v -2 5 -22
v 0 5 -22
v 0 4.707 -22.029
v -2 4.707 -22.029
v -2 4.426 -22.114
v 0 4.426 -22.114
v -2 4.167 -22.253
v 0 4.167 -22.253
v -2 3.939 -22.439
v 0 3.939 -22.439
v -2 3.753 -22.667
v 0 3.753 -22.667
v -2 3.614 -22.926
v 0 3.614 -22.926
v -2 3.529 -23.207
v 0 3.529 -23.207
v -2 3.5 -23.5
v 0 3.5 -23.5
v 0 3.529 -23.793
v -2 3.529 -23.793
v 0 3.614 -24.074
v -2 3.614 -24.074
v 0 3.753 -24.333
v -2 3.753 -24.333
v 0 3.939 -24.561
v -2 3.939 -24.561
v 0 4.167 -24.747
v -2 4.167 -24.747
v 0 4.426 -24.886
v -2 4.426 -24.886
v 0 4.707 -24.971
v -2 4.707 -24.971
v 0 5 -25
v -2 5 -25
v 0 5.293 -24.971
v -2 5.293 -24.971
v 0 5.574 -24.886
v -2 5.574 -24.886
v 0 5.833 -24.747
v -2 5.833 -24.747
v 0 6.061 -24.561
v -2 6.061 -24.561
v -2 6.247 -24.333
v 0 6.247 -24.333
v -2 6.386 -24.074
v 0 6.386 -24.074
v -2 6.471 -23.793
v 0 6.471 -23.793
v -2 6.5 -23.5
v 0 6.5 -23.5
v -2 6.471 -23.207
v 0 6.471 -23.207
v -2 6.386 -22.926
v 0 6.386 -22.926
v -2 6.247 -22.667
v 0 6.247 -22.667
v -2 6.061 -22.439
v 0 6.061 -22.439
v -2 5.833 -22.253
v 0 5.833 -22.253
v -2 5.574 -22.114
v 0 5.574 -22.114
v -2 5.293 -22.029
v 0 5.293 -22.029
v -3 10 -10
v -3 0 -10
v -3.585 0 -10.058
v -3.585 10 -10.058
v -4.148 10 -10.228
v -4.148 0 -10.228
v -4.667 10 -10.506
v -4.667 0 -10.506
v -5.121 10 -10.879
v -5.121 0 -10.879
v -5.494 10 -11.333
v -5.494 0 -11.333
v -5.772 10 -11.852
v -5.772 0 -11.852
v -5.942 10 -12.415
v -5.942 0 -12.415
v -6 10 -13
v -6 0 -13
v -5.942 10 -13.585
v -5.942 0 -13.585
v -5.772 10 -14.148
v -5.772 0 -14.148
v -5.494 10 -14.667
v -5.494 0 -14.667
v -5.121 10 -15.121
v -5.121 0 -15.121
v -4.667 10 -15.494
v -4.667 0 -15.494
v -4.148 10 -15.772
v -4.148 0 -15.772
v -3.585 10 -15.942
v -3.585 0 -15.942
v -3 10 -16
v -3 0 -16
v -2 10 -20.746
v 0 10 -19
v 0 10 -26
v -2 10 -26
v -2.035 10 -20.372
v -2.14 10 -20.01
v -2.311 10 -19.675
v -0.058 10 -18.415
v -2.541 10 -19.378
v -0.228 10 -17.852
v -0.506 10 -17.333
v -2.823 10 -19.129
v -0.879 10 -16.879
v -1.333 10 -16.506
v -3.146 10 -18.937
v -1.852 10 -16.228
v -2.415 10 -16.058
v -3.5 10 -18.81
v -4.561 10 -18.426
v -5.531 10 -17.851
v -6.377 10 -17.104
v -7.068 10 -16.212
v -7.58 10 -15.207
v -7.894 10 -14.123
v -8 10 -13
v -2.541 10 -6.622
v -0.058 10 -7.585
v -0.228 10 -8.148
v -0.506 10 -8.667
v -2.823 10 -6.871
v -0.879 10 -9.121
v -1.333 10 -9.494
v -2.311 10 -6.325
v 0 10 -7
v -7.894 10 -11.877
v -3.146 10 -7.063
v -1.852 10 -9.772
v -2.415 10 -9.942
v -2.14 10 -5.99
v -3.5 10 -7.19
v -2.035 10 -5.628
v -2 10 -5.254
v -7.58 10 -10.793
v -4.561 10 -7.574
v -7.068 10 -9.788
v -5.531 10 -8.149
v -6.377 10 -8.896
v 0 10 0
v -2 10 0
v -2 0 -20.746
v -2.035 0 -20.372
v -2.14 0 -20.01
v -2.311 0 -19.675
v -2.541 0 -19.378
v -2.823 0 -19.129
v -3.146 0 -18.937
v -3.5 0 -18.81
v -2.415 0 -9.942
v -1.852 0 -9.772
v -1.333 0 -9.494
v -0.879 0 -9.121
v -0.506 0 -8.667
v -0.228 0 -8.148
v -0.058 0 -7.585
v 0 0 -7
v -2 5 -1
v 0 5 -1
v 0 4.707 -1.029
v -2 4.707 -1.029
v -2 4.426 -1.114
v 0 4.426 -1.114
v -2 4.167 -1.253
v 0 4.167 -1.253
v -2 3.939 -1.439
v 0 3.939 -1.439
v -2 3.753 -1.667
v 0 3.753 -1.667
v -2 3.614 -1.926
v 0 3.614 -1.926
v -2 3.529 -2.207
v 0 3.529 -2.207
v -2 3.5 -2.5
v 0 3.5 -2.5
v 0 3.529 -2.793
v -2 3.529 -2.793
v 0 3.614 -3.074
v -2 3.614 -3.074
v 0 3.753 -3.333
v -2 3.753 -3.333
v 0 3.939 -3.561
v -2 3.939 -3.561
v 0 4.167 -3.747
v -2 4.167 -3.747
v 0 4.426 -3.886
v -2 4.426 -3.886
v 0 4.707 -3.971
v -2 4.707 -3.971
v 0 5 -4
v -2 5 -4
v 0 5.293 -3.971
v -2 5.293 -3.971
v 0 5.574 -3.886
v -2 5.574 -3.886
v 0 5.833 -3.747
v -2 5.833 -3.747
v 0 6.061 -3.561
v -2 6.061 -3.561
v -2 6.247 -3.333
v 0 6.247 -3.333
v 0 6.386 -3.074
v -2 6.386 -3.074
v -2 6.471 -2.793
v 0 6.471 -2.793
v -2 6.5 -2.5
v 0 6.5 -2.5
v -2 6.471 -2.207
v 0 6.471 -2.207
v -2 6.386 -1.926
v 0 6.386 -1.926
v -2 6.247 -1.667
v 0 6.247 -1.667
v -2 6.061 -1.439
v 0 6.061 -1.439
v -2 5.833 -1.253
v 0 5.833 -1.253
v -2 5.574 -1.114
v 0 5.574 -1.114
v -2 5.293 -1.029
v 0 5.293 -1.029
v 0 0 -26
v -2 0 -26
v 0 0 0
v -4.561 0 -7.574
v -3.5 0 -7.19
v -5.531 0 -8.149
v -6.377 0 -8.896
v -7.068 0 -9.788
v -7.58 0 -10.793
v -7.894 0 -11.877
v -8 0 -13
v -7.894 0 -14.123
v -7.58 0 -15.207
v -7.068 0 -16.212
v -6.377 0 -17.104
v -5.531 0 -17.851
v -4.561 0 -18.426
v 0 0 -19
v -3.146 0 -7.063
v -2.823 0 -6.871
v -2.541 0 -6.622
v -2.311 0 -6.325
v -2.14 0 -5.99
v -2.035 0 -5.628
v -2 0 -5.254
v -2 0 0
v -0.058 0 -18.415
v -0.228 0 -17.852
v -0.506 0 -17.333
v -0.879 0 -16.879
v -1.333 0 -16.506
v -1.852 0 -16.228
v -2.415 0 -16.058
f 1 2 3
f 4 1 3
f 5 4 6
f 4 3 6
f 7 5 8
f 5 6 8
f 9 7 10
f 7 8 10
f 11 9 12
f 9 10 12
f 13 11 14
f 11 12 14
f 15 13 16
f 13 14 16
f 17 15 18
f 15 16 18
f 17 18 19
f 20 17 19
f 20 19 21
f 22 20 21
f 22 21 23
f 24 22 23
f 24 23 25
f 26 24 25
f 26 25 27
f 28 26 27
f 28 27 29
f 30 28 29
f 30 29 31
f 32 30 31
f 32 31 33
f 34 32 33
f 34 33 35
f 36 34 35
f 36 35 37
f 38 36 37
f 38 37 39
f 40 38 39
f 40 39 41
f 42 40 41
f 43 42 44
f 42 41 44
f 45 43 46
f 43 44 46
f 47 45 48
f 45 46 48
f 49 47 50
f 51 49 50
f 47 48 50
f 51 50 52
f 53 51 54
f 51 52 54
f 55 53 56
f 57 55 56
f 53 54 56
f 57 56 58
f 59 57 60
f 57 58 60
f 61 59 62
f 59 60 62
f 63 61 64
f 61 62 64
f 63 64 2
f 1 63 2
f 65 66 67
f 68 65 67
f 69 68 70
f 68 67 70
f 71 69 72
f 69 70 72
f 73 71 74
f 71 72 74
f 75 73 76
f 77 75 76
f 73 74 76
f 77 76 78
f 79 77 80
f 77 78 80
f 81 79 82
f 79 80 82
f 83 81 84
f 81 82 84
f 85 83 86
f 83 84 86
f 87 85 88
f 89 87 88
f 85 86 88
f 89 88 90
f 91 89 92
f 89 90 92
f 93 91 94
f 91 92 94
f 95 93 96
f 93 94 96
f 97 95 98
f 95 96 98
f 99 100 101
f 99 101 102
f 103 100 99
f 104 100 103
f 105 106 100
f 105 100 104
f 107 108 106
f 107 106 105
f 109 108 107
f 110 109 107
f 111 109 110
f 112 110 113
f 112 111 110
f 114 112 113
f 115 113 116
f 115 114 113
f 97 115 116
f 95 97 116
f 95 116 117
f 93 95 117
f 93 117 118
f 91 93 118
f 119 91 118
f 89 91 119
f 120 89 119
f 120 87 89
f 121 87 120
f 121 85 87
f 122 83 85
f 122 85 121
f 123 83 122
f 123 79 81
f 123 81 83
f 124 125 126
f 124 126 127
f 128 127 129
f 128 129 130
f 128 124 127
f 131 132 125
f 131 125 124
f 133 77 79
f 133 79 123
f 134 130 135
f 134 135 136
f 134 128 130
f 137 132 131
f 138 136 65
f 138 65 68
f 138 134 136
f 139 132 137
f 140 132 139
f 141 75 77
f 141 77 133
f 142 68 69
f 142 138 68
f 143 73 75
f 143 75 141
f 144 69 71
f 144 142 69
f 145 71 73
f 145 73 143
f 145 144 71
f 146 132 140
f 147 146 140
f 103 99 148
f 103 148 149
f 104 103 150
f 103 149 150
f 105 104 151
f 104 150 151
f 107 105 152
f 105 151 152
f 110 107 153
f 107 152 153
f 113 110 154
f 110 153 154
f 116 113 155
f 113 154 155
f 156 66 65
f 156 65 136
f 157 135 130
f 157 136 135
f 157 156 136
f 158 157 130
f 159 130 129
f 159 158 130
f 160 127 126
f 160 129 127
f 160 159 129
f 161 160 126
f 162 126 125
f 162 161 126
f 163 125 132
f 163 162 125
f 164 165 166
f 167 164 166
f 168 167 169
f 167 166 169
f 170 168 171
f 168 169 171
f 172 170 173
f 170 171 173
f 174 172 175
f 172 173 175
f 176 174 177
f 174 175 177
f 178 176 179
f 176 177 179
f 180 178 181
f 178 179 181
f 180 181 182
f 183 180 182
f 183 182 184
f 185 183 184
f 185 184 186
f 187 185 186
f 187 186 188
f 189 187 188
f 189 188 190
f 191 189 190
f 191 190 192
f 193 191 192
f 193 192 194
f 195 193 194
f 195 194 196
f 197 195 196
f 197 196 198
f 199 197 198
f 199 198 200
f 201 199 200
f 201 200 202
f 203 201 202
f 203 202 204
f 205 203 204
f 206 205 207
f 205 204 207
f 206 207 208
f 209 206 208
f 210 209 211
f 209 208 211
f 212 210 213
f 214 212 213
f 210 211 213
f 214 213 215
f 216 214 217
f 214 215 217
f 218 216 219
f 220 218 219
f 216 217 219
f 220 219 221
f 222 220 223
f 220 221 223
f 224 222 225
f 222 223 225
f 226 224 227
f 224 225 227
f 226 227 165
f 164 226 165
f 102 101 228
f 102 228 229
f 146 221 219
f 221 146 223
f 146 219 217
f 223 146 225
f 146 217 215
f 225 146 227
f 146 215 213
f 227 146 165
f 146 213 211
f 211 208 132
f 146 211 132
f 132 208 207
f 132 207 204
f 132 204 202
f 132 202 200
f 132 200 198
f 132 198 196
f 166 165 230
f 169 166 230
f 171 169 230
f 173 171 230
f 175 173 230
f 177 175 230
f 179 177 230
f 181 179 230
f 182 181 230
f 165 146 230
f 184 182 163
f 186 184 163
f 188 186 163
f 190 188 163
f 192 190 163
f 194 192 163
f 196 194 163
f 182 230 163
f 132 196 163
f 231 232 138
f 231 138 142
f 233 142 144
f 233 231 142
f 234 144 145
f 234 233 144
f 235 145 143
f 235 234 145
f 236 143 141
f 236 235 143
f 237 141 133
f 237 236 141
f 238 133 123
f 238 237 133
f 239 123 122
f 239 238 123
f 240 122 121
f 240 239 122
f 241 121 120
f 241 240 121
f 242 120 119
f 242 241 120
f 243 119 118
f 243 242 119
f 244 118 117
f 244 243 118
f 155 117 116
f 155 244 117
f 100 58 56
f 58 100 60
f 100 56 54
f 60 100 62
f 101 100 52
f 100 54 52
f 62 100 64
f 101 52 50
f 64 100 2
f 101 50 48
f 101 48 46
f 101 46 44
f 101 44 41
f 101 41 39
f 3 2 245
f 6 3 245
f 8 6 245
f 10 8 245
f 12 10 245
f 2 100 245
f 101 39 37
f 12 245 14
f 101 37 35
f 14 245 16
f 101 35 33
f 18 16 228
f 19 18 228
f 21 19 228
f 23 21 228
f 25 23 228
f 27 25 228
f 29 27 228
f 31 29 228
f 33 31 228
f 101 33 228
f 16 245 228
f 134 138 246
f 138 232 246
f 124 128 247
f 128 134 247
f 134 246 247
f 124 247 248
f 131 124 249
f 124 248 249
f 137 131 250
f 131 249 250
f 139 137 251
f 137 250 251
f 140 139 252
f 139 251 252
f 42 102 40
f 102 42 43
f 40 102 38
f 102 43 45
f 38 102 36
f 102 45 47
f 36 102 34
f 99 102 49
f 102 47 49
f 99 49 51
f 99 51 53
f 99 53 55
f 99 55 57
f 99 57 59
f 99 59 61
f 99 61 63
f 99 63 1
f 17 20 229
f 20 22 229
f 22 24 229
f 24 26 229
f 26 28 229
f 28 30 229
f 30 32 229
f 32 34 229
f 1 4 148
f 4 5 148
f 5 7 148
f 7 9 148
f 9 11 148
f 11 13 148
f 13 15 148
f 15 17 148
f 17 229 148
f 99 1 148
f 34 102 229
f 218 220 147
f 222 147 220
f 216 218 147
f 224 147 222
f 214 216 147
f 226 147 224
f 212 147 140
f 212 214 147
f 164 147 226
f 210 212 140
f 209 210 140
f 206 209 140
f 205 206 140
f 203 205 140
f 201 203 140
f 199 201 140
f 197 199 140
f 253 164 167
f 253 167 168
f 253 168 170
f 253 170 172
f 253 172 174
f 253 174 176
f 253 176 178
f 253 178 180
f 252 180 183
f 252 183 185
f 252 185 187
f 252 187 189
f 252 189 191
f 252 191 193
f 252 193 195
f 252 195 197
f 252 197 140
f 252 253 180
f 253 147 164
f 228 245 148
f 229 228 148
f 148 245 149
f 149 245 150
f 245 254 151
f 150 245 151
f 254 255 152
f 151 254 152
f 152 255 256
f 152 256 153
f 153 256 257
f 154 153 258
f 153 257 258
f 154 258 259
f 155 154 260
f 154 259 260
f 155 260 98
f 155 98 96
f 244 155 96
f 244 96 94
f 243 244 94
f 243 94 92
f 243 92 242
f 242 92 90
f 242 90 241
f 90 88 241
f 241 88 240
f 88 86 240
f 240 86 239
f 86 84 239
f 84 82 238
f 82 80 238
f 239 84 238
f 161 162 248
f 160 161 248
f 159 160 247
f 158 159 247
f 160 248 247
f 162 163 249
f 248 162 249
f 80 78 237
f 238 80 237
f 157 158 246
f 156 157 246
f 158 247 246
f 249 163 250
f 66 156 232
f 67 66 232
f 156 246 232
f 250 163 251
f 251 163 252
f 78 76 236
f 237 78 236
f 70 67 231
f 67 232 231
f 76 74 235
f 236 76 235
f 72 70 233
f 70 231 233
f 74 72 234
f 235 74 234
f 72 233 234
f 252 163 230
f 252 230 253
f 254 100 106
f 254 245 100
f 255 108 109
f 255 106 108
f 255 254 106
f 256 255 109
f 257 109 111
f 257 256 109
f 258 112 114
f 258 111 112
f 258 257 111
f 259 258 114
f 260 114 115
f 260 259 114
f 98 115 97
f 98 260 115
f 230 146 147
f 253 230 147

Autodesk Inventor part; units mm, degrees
ref_plane "YZ Plane" through (0, 0, 0) normal (1, 0, 0) x (0, 1, 0)
ref_plane "XZ Plane" through (0, 0, 0) normal (0, 1, 0) x (-1, 0, 0)
ref_plane "XY Plane" through (0, 0, 0) normal (0, 0, 1) x (1, 0, 0)
sketch "Skizze1" plane through (0, 0, 0) normal (0, 1, 0) x (-1, 0, 0)
  line L0 (0, 0) -> (0, -6)
  line L1 (0, -20) -> (0, -26)
  line L2 (0, -26) -> (2, -26)
  line L3 (2, -26) -> (2, -20.746)
  line L4 (0, 0) -> (2, 0)
  line L5 (2, 0) -> (2, -5.254)
  arc A0 (3, -16) -> (3, -10) centre (3, -13) ccw
  line L6 (6, -13) -> (8, -13)
  line L7 (2, -26) -> (2, -19)
  arc A1 (3.5, -18.8095) -> (3.5, -7.1905) centre (2, -13) ccw
  arc A2 (3.5, -18.8095) -> (2, -20.746) centre (4, -20.746) ccw
  arc A3 (2, -5.254) -> (3.5, -7.1905) centre (4, -5.254) ccw
  line L8 (3, -16) -> (3, -16)
  line L9 (0, -19) -> (0, -20)
  line L10 (3, -10) -> (3, -10)
  line L11 (0, -7) -> (0, -6)
  arc A4 (3, -16) -> (0, -19) centre (3, -19) ccw
  arc A5 (0, -7) -> (3, -10) centre (3, -7) ccw
  point P0 (0, -10)
  point P1 (0, -16)
  point P2 (2, -19)
  point P3 (2, -7)
  dimension "d0" = 10
  dimension "d1" = 3
  dimension "d3" = 10
  dimension "d4" = 2
  dimension "d5" = 7
  dimension "d6" = 2
  dimension "d7" = 7
  dimension "d9" = 3
  dimension "d23" = 2
  dimension "d24" = 7
  dimension "d25" = 2
  dimension "d26" = 3
extrude "Extrusion1" add sketch "Skizze1" along normal blind 10
sketch "Skizze2" plane through (-2, 0, -5) normal (-1, 0, 0) x (0, 0, 1)
  line L0 (5, 0) -> (5, 10) projected
  line L1 (5, 5) -> (2.5, 5)
  line L2 (-21, 0) -> (-21, 10) projected
  line L3 (-21, 5) -> (-18.5, 5)
  dimension "d14" = 2.5
  dimension "d15" = 2.5
hole "Bohrung1" at (-2, 5, -2.5) at (-2, 5, -23.5) direction (1, 0, 0) diameter 3 depth 8 tip angle 118
properties part number "Draht_Halterung"
